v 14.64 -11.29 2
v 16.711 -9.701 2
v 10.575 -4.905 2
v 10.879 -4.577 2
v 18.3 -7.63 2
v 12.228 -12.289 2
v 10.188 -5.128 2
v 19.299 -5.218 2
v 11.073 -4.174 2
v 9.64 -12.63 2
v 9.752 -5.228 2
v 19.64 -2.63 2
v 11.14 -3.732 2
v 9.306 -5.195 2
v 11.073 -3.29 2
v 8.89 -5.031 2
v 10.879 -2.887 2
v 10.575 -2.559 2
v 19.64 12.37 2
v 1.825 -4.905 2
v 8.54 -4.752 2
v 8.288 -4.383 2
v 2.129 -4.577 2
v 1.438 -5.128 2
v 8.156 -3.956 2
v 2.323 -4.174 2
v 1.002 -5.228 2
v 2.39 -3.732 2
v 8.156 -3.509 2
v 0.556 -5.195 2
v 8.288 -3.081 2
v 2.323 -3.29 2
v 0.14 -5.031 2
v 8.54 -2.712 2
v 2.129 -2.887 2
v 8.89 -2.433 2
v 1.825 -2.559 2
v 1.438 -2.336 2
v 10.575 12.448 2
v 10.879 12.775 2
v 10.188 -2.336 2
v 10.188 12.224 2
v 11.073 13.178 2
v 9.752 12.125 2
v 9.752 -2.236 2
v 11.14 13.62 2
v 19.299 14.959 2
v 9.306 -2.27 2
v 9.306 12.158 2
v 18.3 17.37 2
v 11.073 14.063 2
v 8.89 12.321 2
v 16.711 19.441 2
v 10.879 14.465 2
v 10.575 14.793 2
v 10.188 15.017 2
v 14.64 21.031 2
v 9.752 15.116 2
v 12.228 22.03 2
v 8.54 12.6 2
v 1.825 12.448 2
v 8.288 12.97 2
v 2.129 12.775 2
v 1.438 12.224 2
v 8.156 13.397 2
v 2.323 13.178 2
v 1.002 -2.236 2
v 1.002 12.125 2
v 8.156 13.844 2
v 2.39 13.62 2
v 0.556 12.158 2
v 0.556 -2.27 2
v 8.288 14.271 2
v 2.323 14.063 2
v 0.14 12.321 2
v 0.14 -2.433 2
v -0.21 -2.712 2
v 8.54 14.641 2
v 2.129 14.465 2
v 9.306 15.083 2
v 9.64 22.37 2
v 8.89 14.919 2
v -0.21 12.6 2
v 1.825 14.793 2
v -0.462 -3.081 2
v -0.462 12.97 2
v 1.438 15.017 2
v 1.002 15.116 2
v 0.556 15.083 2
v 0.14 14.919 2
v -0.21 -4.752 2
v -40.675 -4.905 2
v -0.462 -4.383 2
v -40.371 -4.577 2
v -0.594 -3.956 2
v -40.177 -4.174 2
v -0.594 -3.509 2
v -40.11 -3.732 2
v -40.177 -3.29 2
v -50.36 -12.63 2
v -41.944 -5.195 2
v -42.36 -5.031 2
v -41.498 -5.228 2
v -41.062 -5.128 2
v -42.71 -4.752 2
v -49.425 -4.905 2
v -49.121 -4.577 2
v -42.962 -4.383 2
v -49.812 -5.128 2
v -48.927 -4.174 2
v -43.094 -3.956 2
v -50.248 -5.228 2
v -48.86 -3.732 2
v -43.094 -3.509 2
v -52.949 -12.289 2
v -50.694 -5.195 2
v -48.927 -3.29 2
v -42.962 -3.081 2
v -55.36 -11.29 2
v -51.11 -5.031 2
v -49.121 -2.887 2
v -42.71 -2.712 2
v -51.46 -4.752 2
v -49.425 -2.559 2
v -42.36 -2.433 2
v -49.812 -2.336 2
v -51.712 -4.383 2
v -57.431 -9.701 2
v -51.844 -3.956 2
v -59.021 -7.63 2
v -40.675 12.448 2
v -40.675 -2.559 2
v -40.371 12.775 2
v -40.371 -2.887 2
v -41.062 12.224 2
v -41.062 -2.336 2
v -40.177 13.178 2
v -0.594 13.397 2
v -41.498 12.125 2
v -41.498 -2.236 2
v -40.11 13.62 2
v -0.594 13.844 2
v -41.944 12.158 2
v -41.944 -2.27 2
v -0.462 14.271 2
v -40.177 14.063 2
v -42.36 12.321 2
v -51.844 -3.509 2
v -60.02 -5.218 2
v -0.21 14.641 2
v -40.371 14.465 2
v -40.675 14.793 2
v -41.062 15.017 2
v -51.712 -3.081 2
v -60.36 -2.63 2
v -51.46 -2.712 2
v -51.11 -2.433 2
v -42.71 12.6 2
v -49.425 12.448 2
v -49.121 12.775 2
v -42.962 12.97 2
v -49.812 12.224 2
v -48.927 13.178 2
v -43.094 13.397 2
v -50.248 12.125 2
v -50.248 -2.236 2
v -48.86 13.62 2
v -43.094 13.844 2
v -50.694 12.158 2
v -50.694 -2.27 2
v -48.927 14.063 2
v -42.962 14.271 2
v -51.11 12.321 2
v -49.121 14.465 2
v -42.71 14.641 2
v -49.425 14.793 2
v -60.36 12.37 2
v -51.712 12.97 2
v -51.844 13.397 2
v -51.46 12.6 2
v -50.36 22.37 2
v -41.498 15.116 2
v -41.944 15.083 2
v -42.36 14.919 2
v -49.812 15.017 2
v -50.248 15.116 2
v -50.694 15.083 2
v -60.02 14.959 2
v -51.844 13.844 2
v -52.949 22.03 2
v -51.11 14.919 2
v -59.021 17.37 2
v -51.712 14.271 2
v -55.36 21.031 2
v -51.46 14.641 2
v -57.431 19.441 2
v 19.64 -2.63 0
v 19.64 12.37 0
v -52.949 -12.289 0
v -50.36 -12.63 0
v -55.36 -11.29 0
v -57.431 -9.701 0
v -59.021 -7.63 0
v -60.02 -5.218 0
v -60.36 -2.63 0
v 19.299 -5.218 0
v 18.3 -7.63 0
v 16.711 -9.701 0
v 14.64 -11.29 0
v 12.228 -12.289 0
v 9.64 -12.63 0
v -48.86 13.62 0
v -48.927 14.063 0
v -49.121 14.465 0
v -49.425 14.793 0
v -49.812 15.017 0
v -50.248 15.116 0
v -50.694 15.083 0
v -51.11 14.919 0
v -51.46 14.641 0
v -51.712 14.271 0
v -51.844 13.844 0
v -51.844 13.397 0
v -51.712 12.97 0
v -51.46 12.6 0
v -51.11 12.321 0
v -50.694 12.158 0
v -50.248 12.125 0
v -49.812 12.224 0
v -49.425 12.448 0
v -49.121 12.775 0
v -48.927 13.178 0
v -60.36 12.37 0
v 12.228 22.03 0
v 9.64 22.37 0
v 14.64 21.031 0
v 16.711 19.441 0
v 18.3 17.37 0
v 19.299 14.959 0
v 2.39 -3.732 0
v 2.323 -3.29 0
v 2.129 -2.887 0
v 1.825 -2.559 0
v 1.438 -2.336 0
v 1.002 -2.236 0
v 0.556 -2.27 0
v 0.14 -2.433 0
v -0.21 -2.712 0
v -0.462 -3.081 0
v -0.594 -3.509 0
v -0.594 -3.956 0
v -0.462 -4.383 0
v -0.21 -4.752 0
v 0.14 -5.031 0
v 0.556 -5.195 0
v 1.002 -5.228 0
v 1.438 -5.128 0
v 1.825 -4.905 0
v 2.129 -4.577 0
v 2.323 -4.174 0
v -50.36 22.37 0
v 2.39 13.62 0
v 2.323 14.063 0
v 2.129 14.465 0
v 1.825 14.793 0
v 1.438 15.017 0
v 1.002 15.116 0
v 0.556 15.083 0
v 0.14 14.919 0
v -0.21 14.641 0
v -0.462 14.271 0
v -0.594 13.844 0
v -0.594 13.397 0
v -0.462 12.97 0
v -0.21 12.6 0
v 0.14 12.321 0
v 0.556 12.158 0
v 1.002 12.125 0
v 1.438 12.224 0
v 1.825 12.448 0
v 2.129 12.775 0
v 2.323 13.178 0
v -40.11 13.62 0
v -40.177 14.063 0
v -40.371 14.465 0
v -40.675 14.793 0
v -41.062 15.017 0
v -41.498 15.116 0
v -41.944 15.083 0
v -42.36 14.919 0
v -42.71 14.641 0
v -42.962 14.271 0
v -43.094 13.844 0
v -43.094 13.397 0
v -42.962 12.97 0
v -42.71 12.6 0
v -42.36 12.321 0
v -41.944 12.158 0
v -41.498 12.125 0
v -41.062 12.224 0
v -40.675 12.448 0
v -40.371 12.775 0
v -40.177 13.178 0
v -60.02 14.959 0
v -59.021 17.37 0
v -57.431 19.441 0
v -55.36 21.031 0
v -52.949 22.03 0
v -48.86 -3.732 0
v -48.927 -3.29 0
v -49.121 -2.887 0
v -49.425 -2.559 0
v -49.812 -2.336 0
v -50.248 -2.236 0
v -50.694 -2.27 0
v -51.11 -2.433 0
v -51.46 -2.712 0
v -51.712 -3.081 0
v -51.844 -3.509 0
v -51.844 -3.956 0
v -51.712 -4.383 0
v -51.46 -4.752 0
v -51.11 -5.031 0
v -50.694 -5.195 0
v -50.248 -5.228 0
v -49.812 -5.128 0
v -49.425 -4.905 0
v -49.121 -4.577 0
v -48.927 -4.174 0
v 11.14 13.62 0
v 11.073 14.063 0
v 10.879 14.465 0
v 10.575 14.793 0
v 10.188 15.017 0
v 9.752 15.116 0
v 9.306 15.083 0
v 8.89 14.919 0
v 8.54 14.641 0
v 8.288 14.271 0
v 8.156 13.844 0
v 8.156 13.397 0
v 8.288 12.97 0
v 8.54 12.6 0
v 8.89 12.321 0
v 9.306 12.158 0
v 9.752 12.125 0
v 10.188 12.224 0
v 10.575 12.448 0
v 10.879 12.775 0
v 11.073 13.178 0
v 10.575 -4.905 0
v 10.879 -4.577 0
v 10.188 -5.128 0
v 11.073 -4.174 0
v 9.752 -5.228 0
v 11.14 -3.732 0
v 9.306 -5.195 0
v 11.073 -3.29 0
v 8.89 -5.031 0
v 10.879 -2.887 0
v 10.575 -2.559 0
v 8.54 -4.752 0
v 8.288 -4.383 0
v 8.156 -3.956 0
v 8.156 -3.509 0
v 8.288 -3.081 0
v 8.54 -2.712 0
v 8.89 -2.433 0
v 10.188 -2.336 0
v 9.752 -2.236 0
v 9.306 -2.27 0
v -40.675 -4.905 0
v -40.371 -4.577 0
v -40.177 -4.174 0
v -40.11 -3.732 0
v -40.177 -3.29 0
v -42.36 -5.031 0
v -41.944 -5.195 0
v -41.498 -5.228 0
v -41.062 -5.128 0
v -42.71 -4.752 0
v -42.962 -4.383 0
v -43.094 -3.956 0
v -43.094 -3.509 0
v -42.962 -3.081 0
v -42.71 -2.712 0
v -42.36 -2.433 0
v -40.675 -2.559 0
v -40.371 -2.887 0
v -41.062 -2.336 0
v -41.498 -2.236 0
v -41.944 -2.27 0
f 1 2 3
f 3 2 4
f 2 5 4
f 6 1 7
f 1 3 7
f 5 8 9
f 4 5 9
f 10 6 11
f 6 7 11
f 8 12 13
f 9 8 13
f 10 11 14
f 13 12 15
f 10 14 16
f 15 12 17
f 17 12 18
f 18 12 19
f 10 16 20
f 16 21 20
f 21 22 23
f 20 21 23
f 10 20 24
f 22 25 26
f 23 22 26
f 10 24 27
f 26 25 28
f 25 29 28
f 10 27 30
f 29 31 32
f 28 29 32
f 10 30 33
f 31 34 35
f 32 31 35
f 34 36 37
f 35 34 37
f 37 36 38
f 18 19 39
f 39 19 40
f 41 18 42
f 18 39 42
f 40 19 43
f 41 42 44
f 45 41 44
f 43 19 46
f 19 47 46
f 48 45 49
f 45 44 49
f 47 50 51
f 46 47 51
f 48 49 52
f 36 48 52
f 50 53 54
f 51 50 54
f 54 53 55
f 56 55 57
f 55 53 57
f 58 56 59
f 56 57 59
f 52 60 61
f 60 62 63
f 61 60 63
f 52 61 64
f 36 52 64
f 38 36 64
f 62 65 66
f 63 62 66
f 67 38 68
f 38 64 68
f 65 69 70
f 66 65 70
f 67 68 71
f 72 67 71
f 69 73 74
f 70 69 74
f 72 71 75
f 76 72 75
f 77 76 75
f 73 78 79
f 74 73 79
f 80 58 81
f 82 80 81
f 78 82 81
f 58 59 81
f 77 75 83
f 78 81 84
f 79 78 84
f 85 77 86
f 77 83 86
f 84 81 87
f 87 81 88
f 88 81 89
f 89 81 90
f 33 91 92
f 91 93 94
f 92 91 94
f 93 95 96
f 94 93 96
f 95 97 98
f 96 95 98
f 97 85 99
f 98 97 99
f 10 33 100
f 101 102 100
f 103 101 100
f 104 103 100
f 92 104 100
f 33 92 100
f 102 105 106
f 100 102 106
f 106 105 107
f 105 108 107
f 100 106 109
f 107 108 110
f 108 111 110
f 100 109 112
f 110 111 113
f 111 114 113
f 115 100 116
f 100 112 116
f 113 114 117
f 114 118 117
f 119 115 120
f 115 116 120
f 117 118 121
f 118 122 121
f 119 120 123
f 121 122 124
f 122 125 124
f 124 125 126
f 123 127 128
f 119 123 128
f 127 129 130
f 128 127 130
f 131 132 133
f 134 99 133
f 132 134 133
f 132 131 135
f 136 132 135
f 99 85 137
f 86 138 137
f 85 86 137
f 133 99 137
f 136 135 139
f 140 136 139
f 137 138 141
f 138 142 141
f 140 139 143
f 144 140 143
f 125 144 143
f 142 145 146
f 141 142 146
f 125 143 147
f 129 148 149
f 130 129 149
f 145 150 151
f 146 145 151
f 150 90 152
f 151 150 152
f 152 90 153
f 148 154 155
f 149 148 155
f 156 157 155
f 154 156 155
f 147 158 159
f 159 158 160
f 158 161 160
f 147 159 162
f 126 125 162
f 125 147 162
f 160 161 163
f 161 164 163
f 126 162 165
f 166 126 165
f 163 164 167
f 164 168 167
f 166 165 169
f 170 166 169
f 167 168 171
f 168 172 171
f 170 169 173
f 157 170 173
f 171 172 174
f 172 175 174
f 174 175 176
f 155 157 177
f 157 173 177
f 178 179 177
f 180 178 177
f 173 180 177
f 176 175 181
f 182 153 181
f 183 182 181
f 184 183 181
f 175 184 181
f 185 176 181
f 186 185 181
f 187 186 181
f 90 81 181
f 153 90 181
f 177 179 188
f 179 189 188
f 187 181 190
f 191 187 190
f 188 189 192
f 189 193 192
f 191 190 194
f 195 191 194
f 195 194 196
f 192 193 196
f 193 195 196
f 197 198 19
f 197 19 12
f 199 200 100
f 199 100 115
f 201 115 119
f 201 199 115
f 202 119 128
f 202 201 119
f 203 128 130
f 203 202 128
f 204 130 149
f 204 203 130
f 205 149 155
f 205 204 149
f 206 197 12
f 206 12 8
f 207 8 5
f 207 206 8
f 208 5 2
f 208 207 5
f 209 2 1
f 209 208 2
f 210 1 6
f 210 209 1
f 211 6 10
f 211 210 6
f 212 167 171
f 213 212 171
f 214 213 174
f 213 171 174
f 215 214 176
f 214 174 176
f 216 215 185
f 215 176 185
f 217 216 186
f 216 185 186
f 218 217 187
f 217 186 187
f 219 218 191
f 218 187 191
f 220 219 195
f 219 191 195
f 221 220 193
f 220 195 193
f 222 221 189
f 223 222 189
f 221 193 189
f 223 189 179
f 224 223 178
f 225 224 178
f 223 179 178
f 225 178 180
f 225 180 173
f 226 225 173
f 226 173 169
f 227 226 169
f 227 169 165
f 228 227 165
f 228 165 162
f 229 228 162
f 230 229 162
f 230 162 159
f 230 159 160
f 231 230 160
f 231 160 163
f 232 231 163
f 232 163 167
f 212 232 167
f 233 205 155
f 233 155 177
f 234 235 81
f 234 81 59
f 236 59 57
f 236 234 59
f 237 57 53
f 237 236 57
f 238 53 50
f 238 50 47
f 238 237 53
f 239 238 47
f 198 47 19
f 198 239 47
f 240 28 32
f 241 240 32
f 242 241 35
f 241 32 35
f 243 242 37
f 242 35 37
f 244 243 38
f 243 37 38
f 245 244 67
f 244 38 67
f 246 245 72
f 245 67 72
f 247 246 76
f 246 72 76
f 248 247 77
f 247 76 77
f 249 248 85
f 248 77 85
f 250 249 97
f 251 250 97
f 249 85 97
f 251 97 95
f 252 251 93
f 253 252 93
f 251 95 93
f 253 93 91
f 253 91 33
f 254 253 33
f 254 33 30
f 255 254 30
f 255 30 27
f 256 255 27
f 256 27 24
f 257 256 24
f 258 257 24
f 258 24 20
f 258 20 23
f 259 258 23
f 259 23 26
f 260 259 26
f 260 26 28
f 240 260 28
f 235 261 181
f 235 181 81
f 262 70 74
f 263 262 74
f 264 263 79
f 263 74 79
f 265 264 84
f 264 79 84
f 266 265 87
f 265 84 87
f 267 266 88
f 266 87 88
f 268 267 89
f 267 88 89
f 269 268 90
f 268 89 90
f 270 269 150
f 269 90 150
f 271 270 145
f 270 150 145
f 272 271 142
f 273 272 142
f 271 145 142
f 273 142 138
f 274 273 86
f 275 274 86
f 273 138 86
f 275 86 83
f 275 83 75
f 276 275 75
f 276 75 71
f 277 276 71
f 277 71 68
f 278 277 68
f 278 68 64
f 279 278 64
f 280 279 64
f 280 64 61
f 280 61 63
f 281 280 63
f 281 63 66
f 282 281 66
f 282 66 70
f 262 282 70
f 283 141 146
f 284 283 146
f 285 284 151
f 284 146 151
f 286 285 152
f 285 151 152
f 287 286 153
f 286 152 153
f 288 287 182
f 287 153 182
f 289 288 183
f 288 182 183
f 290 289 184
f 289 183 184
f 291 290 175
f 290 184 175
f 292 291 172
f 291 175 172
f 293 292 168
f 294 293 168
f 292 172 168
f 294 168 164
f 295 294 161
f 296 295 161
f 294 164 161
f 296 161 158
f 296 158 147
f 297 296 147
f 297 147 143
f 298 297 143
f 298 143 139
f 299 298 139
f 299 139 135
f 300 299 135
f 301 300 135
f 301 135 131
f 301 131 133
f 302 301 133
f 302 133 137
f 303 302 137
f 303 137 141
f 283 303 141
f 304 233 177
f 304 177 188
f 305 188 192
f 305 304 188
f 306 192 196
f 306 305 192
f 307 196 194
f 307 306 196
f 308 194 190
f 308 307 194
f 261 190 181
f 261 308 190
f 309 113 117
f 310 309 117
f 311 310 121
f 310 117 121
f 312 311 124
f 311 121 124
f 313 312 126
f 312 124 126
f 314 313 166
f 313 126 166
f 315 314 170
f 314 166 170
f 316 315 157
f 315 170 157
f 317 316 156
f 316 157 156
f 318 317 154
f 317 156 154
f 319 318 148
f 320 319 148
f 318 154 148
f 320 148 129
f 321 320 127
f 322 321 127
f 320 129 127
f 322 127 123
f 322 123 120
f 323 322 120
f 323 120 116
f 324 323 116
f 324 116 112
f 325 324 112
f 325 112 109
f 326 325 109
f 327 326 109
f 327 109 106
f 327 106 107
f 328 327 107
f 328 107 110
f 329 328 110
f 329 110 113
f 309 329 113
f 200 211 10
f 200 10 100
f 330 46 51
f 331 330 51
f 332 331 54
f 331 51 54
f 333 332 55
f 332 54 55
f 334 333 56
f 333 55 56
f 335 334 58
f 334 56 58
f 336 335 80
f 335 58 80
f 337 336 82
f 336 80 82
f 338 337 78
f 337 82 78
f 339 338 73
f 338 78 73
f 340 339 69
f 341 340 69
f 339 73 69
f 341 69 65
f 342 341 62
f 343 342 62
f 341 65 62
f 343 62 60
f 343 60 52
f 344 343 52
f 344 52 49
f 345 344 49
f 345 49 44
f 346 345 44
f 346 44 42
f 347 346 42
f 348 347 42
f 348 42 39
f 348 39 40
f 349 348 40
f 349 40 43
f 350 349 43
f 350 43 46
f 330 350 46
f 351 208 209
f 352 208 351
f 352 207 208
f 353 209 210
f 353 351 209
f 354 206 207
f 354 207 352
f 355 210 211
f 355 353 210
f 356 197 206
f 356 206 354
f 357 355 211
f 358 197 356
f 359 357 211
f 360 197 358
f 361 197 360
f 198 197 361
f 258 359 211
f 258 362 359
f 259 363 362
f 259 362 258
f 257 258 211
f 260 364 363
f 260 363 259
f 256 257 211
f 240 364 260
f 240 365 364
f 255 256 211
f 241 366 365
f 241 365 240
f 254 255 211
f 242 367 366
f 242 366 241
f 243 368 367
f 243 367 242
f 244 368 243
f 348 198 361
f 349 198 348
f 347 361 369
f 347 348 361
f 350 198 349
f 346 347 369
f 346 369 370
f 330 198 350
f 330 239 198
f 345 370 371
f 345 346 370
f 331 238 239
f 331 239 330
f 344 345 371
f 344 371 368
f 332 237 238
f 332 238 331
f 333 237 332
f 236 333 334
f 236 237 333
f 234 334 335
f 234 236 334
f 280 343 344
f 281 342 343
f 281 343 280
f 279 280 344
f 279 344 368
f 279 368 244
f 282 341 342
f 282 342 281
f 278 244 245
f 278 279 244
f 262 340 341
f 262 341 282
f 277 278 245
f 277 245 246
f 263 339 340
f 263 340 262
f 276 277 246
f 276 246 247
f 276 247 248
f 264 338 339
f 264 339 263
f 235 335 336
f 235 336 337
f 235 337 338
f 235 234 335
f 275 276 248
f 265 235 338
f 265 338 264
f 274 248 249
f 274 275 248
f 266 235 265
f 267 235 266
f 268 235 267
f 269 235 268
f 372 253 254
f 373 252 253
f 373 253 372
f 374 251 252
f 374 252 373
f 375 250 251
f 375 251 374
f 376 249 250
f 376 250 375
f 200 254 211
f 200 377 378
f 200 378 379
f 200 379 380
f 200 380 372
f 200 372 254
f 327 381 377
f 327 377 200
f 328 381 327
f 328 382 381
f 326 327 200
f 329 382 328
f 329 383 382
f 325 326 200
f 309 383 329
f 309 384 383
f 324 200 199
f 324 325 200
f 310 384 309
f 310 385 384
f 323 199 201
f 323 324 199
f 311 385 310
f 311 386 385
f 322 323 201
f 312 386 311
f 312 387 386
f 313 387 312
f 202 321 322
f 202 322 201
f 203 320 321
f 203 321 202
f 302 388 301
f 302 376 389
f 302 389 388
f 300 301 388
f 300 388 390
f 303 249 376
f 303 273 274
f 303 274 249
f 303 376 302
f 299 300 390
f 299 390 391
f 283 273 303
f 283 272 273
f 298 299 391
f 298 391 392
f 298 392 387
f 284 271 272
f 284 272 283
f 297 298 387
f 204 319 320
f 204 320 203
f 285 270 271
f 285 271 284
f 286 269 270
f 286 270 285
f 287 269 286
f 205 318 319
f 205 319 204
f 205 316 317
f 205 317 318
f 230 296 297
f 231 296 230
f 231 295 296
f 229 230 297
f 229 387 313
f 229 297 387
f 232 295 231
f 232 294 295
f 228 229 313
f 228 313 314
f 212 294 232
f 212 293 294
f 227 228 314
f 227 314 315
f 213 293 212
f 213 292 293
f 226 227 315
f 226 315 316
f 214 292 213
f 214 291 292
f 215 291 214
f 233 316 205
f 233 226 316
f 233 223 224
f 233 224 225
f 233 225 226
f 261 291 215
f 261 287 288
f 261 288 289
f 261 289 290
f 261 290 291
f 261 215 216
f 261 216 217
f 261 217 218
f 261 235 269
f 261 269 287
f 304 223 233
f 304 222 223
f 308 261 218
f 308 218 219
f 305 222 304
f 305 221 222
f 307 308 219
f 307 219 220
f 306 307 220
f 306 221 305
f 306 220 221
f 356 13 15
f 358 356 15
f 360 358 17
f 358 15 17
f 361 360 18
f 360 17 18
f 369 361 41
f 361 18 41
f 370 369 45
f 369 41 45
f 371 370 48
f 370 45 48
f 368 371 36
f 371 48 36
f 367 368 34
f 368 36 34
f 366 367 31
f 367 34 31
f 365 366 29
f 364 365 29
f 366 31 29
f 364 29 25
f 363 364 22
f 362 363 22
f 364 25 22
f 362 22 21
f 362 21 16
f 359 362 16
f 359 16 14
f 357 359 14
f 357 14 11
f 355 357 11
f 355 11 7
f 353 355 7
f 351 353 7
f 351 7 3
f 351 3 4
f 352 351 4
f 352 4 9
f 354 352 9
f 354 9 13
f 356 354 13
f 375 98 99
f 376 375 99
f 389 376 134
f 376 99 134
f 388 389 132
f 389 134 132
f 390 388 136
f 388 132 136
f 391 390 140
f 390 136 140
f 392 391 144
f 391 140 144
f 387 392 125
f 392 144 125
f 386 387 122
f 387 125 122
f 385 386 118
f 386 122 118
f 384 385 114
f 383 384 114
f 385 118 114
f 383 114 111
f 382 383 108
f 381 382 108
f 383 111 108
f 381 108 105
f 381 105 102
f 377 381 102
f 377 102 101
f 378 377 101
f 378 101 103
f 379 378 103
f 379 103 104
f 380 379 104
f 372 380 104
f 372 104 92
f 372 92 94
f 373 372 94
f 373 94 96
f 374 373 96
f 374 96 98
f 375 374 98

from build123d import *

# Parameters (mm, degrees)
EXTRUDE_1_DEPTH = 2
MM_2_D          = 3
MM_3_D          = 3


with BuildPart() as part:
    # 草图2 → 凸台-拉伸1 (new body)
    with BuildSketch(Plane.XY):
        with BuildLine():
            Line((-50.360367403, 22.370399323), (9.639632597, 22.370399323))
            ThreePointArc((9.639632597, 22.370399323), (16.710700409, 19.441467134), (19.639632597, 12.370399323))
            Line((19.639632597, 12.370399323), (19.639632597, -2.629600677))
            ThreePointArc((19.639632597, -2.629600677), (16.710700409, -9.700668489), (9.639632597, -12.629600677))
            Line((9.639632597, -12.629600677), (-50.360367403, -12.629600677))
            ThreePointArc((-50.360367403, -12.629600677), (-57.431435215, -9.700668489), (-60.360367403, -2.629600677))
            Line((-60.360367403, -2.629600677), (-60.360367403, 12.370399323))
            ThreePointArc((-60.360367403, 12.370399323), (-57.431435215, 19.441467134), (-50.360367403, 22.370399323))
        make_face()
    extrude(amount=EXTRUDE_1_DEPTH)

    # 大小mm 暗销孔2 (through all)
    with Locations(Plane(origin=(-41.610367403, 13.620399323, 0), x_dir=(-1, 0, 0), z_dir=(0, 0, -1))):
        with Locations((0, 0), (8.75, 0), (0, -17.352577314), (8.75, -17.352577314)):
            Hole(MM_2_D / 2)

    # 大小mm 暗销孔3 (through all)
    with Locations(Plane(origin=(9.639632597, 13.620399323, 0), x_dir=(-1, 0, 0), z_dir=(0, 0, -1))):
        with Locations((0, 0), (8.75, 0), (8.75, -17.352577314), (0, -17.352577314)):
            Hole(MM_3_D / 2)


solid = part.part
